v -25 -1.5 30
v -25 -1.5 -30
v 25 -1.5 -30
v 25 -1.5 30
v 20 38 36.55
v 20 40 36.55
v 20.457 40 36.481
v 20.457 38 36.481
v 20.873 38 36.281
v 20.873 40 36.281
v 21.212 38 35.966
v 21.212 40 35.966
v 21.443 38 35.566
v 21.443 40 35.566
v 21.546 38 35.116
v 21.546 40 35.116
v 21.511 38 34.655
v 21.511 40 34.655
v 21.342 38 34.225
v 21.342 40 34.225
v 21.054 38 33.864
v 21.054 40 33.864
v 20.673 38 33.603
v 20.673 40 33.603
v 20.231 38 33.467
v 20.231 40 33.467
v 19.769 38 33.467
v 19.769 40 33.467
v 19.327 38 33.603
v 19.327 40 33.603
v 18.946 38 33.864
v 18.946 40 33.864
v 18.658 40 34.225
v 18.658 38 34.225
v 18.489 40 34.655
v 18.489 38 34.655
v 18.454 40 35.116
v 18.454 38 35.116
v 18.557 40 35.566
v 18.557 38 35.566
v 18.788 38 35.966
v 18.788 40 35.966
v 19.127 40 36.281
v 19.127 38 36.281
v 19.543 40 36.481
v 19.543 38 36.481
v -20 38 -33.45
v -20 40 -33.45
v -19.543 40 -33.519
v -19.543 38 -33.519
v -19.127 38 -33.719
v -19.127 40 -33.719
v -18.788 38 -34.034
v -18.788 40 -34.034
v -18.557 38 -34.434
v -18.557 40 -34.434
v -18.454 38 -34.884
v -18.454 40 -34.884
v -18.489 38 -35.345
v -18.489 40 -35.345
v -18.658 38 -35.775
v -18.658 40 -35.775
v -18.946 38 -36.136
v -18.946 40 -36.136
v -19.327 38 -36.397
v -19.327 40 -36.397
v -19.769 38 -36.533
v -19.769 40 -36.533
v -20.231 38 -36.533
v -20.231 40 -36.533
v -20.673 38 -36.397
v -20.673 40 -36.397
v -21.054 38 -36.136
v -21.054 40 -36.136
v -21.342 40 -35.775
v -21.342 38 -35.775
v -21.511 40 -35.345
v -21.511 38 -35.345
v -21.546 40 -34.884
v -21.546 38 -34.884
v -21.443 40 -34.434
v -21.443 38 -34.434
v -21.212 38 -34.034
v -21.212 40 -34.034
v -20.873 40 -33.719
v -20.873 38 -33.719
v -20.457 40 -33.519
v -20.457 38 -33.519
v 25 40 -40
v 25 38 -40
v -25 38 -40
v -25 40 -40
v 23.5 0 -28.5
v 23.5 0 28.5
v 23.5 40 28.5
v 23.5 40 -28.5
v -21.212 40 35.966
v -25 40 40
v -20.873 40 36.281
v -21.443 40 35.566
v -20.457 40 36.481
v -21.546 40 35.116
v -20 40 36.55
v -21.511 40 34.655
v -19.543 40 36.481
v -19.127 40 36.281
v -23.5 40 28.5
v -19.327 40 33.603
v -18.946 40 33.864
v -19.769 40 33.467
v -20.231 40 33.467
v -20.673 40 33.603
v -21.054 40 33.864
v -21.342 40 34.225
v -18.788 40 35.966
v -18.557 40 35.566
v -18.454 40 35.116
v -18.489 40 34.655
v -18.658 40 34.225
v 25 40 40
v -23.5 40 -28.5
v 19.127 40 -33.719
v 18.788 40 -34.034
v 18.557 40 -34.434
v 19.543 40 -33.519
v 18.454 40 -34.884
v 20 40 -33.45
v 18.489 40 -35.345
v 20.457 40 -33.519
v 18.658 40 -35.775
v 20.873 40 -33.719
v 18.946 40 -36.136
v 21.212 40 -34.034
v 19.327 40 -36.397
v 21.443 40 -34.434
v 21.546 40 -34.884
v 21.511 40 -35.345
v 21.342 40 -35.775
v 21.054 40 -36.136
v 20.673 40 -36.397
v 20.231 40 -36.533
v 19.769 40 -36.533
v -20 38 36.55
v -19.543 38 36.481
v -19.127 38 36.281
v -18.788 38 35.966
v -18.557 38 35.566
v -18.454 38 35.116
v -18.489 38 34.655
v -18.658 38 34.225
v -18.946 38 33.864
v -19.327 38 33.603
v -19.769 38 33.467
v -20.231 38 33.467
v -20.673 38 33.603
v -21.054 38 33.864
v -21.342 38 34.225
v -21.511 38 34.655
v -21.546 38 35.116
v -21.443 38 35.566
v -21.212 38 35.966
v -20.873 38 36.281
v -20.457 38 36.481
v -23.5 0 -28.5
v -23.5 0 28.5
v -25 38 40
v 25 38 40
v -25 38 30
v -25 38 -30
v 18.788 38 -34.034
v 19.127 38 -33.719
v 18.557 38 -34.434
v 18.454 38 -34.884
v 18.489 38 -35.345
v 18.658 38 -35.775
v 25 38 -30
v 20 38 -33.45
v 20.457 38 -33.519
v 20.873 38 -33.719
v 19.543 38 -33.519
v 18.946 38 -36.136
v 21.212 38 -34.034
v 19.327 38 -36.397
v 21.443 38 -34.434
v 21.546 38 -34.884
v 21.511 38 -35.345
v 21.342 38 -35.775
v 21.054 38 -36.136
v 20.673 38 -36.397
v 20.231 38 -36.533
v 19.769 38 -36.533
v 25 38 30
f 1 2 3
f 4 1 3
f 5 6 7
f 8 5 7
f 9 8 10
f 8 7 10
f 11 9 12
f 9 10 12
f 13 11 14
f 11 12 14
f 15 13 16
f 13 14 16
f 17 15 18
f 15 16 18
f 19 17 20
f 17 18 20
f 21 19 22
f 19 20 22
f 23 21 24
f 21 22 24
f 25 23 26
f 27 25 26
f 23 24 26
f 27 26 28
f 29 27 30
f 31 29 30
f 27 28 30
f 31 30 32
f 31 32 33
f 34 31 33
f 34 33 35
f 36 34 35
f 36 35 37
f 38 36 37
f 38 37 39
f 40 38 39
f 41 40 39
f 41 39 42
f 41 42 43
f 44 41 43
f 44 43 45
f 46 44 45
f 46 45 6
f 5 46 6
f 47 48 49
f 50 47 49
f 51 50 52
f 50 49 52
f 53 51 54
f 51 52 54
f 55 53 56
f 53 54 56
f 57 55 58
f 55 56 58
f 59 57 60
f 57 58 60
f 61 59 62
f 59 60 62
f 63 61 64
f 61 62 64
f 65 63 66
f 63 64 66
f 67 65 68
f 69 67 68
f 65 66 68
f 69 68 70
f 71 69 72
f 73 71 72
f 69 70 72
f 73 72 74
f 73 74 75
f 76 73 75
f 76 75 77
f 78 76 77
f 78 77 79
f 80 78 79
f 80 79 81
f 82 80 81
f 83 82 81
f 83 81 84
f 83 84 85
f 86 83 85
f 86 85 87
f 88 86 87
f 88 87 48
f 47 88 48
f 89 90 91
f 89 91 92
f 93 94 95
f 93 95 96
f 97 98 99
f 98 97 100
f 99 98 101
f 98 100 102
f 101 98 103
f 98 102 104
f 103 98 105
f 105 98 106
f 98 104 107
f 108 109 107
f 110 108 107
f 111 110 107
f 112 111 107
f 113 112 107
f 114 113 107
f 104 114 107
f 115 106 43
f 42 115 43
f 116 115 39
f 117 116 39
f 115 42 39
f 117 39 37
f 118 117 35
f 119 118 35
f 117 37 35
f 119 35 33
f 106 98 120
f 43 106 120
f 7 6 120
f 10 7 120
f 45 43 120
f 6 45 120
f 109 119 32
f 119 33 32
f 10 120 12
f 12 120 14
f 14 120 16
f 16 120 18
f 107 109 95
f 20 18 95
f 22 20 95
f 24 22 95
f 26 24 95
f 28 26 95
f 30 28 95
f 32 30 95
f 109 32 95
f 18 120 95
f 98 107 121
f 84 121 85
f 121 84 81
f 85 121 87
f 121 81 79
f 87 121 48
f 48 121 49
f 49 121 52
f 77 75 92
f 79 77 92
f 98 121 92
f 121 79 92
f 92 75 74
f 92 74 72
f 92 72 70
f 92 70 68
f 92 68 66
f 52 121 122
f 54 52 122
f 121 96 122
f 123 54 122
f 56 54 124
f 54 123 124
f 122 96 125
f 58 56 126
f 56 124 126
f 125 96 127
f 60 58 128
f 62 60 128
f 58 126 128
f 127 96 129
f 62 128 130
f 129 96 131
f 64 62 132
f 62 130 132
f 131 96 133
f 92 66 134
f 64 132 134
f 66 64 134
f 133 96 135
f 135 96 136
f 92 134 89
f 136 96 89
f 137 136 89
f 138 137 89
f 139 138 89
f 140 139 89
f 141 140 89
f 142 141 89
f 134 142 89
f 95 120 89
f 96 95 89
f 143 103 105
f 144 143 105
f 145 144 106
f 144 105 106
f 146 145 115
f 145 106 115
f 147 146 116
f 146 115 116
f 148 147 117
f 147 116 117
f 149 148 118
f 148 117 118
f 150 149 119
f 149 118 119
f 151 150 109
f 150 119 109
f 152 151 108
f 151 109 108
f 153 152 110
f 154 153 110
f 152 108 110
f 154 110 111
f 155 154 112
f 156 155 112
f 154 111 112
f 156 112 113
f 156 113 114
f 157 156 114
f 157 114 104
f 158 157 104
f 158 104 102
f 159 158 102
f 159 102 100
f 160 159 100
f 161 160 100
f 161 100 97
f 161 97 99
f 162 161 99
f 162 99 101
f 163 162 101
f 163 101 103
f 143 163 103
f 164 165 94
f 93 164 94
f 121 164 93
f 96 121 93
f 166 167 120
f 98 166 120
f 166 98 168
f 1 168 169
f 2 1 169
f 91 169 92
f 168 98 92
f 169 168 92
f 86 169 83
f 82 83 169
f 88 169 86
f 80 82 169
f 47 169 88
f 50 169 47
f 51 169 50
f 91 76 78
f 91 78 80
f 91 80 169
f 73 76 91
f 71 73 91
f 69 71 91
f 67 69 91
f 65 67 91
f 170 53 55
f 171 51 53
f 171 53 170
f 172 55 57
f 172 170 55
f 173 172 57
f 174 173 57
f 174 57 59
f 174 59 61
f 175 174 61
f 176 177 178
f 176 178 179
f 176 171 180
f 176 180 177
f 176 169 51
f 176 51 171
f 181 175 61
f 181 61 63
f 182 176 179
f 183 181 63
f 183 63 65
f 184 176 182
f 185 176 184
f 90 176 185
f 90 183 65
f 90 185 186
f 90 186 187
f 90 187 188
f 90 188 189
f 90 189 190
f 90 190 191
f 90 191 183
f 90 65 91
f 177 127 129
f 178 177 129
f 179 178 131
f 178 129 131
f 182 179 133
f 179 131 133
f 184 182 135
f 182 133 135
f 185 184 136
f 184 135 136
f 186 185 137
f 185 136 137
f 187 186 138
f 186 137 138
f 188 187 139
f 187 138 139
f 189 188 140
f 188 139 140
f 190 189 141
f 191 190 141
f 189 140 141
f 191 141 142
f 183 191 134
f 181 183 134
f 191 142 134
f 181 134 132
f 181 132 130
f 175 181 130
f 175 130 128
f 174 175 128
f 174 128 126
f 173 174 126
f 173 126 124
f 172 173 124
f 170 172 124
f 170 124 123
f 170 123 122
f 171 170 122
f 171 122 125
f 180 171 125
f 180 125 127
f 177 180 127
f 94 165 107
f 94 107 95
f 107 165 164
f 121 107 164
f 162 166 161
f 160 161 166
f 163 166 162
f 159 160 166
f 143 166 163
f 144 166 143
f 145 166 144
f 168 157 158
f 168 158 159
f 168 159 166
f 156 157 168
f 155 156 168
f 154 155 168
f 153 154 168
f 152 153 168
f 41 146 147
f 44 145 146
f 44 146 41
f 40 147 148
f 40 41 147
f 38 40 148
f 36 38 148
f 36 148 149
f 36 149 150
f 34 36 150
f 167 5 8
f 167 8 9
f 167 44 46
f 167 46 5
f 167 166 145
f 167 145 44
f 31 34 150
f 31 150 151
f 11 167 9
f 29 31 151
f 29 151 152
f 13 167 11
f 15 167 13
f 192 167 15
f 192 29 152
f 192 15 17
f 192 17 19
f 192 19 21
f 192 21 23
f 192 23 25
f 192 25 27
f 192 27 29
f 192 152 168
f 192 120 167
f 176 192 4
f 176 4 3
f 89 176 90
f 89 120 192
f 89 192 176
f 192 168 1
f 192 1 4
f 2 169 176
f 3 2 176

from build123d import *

# Parameters (mm, degrees)
SKETCH1_W           = 50
SKETCH1_H           = 60
SKETCH1_W_2         = 47
SKETCH1_H_2         = 57
BOSS_EXTRUDE6_DEPTH = 40
SKETCH7_W           = 50
SKETCH7_H           = 60
BOSS_EXTRUDE8_DEPTH = 1.5
SKETCH8_W           = 10
SKETCH8_H           = 2
BOSS_EXTRUDE9_DEPTH = 50
SKETCH9_R           = 1.55
CUT_EXTRUDE1_DEPTH  = 3


with BuildPart() as part:
    # Sketch1 → Boss-Extrude6 (new body)
    with BuildSketch(Plane(origin=(0, 0, 0), x_dir=(1, 0, 0), z_dir=(0, 1, 0))):
        Rectangle(SKETCH1_W, SKETCH1_H)
        Rectangle(SKETCH1_W_2, SKETCH1_H_2, mode=Mode.SUBTRACT)
    extrude(amount=BOSS_EXTRUDE6_DEPTH)

    # Sketch7 → Boss-Extrude8 (add)
    with BuildSketch(Plane.XZ):
        Rectangle(SKETCH7_W, SKETCH7_H)
    extrude(amount=BOSS_EXTRUDE8_DEPTH)

    # Sketch8 → Boss-Extrude9 (add)
    with BuildSketch(Plane(origin=(25, 0, 0), x_dir=(0, 0, -1), z_dir=(1, 0, 0))):
        with Locations((-35, 39)):
            Rectangle(SKETCH8_W, SKETCH8_H)
        with Locations((35, 39)):
            Rectangle(SKETCH8_W, SKETCH8_H)
    extrude(amount=-BOSS_EXTRUDE9_DEPTH)

    # Sketch9 → Cut-Extrude1 (cut)
    with BuildSketch(Plane(origin=(0, 40, 0), x_dir=(1, 0, 0), z_dir=(0, 1, 0))):
        with Locations(Location((-20, 35, 0), (0, 0, 270))):
            Circle(SKETCH9_R)
        with Locations(Location((20, 35, 0), (0, 0, 270))):
            Circle(SKETCH9_R)
        with Locations(Location((20, -35, 0), (0, 0, 270))):
            Circle(SKETCH9_R)
        with Locations(Location((-20, -35, 0), (0, 0, 270))):
            Circle(SKETCH9_R)
    extrude(amount=-CUT_EXTRUDE1_DEPTH, mode=Mode.SUBTRACT)


solid = part.part
